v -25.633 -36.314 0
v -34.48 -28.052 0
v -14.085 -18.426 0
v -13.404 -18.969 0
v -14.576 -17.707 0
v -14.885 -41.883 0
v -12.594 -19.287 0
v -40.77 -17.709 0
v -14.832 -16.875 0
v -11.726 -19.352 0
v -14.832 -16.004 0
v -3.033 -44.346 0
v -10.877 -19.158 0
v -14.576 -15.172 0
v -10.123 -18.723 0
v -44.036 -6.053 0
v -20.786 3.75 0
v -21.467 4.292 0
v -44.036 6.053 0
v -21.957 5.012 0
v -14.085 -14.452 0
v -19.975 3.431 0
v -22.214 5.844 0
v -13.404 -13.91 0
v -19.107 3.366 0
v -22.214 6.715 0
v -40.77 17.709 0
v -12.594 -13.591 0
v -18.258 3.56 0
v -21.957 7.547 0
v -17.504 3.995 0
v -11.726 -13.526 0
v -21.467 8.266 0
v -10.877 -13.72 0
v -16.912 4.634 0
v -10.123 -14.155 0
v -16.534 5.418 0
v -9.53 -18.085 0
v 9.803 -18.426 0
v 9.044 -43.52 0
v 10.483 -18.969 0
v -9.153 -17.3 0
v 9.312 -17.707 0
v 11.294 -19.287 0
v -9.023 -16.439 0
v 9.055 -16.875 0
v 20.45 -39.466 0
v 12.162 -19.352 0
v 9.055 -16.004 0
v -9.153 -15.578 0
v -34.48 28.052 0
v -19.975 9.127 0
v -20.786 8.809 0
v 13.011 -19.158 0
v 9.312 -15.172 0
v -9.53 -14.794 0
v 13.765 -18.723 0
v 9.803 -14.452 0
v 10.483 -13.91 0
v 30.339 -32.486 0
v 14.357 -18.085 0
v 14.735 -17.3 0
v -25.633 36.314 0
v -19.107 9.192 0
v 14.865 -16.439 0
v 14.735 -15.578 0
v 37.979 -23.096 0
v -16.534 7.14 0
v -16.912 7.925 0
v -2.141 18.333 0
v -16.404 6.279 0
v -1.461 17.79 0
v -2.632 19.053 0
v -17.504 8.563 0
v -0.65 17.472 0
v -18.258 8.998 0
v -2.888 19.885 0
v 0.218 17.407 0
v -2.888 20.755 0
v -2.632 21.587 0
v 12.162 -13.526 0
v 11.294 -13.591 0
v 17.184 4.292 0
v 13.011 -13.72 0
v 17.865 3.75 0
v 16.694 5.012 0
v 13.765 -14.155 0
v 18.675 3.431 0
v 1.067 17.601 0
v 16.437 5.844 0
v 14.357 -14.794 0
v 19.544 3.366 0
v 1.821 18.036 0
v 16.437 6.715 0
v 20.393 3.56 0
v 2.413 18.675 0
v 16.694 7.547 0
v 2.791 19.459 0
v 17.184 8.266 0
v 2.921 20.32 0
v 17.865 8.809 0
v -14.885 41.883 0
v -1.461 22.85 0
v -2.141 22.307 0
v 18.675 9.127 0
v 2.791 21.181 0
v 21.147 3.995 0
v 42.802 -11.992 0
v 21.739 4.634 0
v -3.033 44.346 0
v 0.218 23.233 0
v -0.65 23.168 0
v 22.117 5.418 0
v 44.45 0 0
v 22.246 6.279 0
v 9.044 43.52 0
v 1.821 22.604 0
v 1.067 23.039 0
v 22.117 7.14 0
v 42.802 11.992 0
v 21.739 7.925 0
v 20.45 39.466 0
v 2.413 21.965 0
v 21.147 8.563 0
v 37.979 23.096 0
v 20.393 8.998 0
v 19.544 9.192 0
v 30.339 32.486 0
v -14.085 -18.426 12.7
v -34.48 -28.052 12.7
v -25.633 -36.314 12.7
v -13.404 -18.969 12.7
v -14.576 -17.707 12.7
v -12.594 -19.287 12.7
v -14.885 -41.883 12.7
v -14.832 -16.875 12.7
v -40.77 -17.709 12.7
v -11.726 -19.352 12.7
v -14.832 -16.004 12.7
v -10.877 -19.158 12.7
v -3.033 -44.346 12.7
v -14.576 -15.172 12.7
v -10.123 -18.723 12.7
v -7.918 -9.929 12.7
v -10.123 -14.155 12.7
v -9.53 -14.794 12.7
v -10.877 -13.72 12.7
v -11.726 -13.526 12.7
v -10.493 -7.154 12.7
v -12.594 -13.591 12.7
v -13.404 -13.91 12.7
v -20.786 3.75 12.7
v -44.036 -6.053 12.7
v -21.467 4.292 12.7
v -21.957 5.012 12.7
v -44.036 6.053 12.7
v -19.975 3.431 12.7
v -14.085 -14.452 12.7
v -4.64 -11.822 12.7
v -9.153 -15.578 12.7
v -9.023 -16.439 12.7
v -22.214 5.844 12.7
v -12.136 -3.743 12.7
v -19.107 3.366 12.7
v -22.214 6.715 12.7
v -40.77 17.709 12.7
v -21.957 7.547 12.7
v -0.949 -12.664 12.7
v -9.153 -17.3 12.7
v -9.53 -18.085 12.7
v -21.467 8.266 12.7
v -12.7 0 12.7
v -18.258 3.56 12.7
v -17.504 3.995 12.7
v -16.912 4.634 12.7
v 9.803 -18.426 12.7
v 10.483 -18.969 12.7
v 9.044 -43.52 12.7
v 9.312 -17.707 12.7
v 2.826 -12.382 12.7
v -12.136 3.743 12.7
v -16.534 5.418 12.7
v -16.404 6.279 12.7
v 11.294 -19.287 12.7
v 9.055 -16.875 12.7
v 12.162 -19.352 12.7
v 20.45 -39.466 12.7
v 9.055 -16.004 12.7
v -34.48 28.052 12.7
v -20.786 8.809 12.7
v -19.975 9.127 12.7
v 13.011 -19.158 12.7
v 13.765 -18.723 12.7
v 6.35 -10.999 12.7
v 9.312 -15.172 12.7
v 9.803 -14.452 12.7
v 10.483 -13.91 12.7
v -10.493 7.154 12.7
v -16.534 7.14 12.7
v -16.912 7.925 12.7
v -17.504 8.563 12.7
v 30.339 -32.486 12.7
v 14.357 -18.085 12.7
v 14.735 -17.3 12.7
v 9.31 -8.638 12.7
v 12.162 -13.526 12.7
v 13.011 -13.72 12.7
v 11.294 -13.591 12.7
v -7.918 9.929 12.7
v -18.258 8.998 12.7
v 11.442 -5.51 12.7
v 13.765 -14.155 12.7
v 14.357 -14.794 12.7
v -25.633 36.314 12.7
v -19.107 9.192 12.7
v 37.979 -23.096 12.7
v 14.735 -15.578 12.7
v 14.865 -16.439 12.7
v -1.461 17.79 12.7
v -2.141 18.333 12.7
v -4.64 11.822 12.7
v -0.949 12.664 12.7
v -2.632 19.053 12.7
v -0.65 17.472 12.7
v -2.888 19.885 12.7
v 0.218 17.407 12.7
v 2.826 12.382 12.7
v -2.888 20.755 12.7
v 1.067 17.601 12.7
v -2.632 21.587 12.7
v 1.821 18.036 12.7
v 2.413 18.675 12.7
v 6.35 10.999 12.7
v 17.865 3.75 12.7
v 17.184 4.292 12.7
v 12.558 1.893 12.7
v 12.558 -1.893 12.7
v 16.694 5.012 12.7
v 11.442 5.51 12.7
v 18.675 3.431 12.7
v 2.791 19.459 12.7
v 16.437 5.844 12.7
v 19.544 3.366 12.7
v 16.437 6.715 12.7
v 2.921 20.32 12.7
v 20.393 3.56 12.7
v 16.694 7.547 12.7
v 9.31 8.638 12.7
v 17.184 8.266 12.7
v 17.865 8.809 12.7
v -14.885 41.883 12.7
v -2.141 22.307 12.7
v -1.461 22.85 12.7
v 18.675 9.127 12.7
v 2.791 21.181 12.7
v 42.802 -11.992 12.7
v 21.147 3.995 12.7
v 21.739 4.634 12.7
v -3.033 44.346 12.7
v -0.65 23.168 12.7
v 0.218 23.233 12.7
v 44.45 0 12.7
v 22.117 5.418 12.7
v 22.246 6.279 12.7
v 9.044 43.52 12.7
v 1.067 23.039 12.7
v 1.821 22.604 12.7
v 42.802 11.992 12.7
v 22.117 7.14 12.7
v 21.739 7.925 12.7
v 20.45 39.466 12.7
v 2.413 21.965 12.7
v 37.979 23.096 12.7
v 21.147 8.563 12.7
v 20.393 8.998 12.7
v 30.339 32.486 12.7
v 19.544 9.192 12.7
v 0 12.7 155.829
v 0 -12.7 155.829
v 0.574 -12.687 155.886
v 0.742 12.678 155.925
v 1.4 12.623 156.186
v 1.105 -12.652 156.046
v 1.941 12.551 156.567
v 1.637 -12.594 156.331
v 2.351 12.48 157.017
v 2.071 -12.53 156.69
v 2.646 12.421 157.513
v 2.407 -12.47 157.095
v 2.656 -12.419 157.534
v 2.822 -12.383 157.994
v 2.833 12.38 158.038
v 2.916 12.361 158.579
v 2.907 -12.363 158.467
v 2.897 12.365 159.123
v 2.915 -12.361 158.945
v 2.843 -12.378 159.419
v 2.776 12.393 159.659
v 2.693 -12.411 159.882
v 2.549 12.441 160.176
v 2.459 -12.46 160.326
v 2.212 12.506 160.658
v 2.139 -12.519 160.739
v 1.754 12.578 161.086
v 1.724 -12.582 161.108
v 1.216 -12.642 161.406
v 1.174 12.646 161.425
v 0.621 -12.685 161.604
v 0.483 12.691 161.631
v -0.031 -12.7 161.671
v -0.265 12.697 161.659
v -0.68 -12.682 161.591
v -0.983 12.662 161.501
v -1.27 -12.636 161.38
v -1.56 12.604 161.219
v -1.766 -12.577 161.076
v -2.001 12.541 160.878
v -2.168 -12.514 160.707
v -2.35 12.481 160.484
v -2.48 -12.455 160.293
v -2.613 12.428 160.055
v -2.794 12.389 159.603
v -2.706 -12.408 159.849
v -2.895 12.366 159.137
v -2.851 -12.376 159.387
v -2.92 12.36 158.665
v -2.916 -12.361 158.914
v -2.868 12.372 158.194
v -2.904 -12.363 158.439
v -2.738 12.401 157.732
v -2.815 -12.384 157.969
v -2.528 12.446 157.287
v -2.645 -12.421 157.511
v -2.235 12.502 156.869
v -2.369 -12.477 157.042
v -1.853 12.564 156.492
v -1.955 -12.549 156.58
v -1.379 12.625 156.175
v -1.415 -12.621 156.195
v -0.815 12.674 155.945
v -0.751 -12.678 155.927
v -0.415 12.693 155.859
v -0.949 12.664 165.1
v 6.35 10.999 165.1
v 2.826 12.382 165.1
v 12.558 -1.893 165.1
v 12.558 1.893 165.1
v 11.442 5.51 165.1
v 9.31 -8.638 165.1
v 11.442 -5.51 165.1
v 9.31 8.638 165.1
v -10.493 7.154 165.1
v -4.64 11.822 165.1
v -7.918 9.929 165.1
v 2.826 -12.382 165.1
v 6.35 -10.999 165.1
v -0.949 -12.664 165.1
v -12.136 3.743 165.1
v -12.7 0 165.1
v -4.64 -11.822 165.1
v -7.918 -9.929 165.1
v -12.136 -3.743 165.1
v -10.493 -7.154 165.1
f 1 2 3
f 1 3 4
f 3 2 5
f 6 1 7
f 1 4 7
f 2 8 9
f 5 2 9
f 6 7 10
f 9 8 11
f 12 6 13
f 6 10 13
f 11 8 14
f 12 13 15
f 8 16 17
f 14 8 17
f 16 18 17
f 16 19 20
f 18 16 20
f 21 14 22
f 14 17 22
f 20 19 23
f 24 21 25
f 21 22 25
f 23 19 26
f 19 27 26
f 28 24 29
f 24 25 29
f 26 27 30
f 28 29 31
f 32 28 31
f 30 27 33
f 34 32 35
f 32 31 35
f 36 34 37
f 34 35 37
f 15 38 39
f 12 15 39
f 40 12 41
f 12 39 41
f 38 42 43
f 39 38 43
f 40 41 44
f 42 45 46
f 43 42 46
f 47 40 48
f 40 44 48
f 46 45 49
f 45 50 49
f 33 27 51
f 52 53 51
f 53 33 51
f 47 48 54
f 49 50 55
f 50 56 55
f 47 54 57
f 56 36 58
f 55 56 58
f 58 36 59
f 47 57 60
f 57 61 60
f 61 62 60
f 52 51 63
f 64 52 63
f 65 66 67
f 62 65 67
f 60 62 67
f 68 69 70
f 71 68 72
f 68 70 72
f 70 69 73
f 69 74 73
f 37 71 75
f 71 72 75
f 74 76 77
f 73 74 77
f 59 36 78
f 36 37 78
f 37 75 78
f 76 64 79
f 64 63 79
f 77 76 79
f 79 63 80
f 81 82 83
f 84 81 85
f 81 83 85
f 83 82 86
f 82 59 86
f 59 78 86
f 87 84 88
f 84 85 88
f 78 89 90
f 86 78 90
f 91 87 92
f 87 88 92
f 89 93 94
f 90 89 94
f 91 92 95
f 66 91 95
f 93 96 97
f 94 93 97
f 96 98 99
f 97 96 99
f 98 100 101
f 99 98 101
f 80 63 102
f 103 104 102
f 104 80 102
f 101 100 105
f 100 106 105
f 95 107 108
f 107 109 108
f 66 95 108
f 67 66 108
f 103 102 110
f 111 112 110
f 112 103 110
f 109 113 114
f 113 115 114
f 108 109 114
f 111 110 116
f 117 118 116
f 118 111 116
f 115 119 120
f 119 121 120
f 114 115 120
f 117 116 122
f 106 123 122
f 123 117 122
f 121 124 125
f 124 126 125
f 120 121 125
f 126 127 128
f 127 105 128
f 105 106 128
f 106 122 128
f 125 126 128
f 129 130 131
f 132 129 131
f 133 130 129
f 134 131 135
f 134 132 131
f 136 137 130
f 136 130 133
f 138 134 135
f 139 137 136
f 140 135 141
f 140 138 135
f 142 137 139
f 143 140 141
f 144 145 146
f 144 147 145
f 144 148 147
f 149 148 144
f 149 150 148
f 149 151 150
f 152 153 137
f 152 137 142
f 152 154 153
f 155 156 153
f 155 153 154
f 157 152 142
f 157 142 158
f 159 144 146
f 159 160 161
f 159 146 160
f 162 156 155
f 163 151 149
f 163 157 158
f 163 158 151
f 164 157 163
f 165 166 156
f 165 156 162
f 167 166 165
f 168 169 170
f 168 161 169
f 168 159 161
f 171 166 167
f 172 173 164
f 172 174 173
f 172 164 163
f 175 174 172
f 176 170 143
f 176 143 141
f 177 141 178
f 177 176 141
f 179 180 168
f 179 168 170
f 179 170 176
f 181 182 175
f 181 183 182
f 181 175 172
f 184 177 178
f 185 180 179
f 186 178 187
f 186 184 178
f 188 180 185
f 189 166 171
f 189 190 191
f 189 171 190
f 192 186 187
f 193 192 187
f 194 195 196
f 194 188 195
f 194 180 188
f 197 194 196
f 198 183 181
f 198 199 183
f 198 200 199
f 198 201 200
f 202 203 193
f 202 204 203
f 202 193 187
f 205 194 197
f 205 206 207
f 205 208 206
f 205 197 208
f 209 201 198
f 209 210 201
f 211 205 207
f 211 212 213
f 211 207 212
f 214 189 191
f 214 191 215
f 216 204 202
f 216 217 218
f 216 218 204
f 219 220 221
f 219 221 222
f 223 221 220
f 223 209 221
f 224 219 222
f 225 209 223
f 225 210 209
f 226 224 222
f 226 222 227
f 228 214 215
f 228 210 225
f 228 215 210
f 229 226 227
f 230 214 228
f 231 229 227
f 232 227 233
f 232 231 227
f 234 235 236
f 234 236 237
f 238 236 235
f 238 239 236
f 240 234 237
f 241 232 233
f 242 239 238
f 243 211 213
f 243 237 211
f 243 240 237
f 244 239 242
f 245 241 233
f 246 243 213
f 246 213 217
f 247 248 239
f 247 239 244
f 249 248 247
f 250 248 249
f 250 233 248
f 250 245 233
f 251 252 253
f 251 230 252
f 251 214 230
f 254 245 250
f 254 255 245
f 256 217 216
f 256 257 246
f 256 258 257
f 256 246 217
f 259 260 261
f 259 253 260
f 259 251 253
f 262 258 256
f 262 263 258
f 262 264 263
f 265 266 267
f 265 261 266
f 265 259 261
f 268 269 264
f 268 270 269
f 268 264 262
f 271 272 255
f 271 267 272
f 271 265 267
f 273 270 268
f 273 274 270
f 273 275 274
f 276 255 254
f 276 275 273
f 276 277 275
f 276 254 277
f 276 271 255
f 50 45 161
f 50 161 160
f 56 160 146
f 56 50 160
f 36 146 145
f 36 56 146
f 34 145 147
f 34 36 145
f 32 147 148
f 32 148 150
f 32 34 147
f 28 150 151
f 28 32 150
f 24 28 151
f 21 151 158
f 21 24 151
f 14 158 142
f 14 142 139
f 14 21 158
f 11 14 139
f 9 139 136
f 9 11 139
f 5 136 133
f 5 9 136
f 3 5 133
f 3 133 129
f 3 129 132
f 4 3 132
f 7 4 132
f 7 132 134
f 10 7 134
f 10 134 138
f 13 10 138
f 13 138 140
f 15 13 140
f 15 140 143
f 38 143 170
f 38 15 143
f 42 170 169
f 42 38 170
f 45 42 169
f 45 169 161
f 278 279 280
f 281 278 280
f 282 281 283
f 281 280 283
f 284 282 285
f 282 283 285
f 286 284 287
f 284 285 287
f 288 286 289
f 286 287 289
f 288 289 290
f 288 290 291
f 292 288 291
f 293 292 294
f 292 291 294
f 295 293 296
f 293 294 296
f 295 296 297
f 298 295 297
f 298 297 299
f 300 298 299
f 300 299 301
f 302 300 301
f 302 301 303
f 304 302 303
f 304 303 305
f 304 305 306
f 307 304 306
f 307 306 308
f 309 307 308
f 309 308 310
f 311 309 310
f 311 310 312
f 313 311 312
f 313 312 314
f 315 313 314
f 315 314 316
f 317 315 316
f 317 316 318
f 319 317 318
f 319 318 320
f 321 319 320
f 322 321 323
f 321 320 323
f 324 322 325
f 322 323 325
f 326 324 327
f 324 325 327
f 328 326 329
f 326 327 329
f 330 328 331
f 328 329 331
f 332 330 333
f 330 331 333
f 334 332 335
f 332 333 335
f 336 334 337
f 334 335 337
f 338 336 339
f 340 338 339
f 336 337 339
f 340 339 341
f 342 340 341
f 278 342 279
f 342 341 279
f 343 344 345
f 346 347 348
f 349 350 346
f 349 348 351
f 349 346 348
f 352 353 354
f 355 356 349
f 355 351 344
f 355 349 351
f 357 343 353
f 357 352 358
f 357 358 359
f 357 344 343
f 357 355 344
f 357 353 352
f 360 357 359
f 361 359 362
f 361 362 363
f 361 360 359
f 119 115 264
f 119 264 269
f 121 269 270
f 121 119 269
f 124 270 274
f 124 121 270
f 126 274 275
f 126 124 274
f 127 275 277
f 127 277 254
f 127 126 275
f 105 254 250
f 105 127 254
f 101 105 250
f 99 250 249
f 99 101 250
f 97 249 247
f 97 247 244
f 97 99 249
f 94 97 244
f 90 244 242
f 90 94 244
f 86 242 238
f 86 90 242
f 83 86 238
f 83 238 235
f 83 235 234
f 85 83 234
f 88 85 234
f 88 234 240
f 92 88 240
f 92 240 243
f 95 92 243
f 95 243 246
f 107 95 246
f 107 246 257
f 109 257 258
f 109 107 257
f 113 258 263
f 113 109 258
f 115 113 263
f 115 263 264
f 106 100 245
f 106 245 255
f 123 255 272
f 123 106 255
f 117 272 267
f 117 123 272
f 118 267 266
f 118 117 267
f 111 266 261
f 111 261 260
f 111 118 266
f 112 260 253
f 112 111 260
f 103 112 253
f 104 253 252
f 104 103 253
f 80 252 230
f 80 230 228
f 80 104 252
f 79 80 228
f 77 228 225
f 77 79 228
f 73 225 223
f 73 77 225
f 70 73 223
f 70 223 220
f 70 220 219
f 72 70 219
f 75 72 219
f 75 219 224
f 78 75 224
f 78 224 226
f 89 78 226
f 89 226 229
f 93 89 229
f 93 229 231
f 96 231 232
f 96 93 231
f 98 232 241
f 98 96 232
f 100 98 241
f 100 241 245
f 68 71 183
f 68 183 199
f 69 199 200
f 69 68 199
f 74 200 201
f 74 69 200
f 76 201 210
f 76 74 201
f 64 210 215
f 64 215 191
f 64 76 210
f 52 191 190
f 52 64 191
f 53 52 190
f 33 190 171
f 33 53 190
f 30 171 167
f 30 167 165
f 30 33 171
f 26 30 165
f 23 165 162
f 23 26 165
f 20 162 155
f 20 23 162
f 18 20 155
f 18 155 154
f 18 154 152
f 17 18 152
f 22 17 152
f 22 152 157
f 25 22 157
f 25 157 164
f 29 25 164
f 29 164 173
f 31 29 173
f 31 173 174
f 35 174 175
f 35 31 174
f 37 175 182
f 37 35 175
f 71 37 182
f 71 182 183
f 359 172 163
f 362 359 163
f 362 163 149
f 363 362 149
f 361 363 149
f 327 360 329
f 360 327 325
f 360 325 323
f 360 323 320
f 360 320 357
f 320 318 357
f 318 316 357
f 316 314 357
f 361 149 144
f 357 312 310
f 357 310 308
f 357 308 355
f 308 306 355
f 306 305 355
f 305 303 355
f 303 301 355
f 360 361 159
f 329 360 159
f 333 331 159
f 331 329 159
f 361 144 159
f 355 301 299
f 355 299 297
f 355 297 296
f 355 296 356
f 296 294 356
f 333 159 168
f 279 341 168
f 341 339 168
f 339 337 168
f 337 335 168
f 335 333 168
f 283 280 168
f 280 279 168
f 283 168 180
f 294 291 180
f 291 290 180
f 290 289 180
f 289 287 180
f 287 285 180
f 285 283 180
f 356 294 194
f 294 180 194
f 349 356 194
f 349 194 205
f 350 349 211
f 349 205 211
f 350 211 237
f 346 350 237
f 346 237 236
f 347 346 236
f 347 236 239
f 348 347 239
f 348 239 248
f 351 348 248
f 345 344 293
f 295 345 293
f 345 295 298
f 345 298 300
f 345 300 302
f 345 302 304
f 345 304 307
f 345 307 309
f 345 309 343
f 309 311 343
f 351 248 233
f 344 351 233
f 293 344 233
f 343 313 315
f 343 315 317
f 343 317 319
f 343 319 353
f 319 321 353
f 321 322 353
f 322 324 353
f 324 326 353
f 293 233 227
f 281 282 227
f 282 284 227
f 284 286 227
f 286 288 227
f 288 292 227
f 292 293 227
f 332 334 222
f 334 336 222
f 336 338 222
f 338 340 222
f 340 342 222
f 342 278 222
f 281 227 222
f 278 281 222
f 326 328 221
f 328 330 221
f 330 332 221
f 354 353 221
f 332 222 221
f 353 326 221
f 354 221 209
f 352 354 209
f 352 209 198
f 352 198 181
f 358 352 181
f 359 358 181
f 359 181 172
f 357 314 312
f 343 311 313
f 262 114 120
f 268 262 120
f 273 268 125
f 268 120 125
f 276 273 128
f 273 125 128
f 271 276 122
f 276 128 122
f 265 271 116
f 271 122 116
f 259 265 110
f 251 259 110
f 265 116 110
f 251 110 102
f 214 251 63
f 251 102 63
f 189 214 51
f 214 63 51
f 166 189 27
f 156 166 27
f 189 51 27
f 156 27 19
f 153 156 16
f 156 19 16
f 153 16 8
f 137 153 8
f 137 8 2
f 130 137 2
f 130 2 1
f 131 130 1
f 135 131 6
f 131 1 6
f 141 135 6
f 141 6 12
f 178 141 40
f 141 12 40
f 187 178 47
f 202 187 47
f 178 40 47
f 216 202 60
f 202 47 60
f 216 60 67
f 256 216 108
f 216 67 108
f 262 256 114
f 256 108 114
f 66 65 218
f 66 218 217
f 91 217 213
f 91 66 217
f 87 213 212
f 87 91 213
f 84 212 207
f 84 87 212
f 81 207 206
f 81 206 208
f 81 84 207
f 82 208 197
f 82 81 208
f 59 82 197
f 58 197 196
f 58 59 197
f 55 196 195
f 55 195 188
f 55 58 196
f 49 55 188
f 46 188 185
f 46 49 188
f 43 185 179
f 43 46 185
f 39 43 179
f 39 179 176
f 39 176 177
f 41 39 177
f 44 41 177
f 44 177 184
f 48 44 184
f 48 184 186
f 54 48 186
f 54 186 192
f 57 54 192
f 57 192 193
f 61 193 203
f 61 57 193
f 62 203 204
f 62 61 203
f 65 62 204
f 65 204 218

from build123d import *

# Parameters (mm, degrees)
SKETCH1_R           = 44.45
SKETCH1_R_2         = 2.921
BOSS_EXTRUDE1_DEPTH = 12.7
SKETCH2_R           = 12.7
BOSS_EXTRUDE2_DEPTH = 152.4
CUT_EXTRUDE1_REACH  = 182.277
SKETCH4_R           = 2.921


with BuildPart() as part:
    # Sketch1 → Boss-Extrude1 (new body)
    with BuildSketch(Plane.XY):
        Circle(SKETCH1_R)
        with Locations((0, 20.32)):
            Circle(SKETCH1_R_2, mode=Mode.SUBTRACT)
        with Locations((19.325468411, 6.279225326)):
            Circle(SKETCH1_R_2, mode=Mode.SUBTRACT)
        with Locations((11.943796327, -16.439225326)):
            Circle(SKETCH1_R_2, mode=Mode.SUBTRACT)
        with Locations((-11.943796327, -16.439225326)):
            Circle(SKETCH1_R_2, mode=Mode.SUBTRACT)
        with Locations((-19.325468411, 6.279225326)):
            Circle(SKETCH1_R_2, mode=Mode.SUBTRACT)
    extrude(amount=BOSS_EXTRUDE1_DEPTH)

    # Sketch2 → Boss-Extrude2 (add)
    with BuildSketch(Plane.XY.offset(12.7)):
        with Locations(Location((0, 0, 0), (0, 0, 180))):
            Circle(SKETCH2_R)
    extrude(amount=BOSS_EXTRUDE2_DEPTH)

    # Sketch4 → Cut-Extrude1 (cut, up to next)
    with BuildSketch(Plane(origin=(0, -12.7, 0), x_dir=(-1, 0, 0), z_dir=(0, -1, 0)), mode=Mode.PRIVATE) as cut_extrude1_sk1:
        with Locations(Location((0, -158.75, 0), (0, 0, 90))):
            Circle(SKETCH4_R)
    cut_extrude1_tool1 = extrude(cut_extrude1_sk1.sketch, amount=-CUT_EXTRUDE1_REACH, mode=Mode.PRIVATE) & part.part
    add(cut_extrude1_tool1.solids().sort_by_distance((0, -12.7, 158.75))[0], mode=Mode.SUBTRACT)


solid = part.part
